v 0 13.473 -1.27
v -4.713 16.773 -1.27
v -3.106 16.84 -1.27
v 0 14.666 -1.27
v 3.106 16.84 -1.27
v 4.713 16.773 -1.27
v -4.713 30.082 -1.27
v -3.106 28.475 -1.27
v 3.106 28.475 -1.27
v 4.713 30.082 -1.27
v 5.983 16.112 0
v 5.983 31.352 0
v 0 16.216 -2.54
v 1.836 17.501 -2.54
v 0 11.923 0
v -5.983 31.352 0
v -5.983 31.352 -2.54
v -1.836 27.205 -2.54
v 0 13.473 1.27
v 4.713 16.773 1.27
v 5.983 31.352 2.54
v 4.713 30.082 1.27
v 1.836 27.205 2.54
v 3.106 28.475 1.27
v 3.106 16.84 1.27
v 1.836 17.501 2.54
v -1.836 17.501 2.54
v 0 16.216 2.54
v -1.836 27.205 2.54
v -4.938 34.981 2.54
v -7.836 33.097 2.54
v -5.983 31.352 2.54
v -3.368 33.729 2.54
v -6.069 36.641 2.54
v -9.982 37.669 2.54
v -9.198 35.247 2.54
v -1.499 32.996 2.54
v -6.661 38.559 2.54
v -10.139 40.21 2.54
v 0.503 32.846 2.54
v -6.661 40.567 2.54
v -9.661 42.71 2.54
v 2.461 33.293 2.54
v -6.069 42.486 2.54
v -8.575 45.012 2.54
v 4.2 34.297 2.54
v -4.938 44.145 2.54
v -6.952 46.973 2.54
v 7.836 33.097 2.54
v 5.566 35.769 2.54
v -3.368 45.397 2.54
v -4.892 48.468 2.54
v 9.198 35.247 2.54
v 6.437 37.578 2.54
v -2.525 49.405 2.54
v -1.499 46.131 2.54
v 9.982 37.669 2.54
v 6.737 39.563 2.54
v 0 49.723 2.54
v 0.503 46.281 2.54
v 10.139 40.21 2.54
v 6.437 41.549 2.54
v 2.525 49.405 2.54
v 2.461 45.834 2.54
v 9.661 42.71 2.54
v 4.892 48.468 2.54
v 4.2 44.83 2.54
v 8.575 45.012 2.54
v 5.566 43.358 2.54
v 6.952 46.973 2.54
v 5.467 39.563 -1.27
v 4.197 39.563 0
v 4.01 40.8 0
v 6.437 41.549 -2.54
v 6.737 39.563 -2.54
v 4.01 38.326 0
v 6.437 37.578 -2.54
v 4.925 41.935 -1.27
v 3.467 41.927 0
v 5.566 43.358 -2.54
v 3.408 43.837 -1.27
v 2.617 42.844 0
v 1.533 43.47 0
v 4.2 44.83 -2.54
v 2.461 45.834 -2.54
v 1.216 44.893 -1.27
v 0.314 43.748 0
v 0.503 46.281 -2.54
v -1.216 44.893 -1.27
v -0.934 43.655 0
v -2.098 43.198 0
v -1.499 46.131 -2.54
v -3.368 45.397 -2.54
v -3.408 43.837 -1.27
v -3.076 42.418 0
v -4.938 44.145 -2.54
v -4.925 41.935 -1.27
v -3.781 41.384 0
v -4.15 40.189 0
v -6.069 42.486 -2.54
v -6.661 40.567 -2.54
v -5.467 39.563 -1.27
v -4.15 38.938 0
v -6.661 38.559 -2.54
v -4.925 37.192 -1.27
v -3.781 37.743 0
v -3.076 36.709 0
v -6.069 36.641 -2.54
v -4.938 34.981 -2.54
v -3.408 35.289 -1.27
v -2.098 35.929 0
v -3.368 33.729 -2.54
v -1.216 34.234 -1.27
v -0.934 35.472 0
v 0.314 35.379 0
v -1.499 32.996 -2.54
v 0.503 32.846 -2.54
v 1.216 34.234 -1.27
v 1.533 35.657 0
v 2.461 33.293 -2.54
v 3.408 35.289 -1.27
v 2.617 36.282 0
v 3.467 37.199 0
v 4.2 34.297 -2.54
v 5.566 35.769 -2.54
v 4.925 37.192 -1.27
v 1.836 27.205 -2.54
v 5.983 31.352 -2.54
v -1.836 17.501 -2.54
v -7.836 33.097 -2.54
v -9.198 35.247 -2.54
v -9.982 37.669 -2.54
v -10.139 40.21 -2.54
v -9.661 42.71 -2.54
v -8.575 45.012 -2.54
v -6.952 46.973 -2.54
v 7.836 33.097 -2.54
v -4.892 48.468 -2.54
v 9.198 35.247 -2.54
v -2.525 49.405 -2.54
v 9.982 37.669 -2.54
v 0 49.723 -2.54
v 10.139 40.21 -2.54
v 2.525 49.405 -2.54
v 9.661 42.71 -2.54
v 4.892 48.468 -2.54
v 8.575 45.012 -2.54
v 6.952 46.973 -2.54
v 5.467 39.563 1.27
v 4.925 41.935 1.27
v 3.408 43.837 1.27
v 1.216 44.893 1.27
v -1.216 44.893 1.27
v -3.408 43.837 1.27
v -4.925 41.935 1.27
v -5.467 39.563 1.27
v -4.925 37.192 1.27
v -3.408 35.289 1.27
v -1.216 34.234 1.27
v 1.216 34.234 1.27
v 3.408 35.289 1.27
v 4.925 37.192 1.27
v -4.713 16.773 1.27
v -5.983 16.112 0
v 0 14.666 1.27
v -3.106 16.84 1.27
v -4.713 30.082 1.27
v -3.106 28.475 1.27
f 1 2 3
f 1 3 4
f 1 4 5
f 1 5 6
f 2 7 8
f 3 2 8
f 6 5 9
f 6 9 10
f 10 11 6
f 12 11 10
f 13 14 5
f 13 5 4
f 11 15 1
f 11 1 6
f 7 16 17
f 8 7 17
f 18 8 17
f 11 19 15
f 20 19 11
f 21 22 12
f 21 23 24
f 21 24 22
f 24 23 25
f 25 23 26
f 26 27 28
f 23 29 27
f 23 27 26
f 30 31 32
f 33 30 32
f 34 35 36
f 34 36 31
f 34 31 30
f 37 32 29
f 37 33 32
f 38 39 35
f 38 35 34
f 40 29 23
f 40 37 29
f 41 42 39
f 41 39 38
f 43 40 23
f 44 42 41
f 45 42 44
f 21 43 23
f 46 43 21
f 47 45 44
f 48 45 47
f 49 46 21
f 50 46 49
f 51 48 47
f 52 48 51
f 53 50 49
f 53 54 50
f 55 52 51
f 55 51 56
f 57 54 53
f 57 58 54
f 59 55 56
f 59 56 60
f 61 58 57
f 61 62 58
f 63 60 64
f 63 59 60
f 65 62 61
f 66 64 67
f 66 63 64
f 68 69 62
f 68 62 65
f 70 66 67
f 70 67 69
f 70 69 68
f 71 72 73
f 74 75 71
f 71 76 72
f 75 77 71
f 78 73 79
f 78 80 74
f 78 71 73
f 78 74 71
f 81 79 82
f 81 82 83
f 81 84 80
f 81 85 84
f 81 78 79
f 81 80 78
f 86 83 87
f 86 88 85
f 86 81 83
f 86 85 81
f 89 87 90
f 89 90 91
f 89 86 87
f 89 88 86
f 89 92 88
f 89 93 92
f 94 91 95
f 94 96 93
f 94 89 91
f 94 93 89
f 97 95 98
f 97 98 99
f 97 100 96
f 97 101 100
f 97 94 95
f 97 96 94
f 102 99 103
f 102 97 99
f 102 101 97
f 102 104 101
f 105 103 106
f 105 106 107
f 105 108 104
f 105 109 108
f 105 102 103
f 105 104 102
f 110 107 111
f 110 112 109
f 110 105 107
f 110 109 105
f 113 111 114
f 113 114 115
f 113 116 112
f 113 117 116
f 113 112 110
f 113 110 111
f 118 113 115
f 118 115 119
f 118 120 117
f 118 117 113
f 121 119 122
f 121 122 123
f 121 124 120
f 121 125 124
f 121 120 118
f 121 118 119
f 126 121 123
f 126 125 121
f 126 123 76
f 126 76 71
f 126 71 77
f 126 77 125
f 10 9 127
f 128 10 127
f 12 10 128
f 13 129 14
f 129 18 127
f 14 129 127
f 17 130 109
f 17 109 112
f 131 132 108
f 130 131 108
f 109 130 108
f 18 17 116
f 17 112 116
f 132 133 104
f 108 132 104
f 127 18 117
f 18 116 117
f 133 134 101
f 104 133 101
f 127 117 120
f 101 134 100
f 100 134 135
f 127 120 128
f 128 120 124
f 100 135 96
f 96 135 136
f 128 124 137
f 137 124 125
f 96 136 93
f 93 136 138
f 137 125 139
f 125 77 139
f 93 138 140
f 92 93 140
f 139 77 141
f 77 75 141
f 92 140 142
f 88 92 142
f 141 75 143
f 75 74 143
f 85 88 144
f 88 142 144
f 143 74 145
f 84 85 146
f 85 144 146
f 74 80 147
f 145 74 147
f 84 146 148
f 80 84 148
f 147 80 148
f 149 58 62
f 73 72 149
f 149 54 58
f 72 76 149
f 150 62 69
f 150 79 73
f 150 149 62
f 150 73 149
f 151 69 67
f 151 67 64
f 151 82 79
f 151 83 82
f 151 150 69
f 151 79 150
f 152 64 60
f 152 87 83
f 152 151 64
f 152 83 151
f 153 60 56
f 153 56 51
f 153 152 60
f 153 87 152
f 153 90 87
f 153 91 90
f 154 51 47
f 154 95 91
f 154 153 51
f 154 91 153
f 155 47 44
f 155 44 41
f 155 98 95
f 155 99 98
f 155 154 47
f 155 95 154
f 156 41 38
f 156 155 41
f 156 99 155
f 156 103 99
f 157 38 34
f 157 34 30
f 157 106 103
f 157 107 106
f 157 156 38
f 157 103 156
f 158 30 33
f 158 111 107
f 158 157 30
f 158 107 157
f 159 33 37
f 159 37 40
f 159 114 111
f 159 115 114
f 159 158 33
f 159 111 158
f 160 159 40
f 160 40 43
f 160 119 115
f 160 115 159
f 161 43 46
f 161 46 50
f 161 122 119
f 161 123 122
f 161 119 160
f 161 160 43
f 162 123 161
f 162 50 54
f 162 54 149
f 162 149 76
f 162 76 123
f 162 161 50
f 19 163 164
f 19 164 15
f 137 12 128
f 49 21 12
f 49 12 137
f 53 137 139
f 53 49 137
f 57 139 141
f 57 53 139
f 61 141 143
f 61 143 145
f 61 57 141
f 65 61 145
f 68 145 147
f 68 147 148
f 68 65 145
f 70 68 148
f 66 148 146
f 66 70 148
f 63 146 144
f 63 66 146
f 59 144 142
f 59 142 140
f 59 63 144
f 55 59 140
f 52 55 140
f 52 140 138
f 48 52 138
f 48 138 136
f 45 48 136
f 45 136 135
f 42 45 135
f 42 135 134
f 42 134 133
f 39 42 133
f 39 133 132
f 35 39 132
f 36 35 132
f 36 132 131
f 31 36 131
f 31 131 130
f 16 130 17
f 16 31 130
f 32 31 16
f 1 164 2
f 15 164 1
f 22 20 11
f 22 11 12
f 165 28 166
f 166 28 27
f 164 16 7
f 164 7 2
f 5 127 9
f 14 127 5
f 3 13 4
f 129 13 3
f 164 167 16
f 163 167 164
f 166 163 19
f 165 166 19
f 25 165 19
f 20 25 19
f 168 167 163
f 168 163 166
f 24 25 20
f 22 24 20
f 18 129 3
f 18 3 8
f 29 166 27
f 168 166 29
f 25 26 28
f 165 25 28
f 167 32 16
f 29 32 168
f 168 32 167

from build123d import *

# Parameters (mm, degrees)
F0_R     = 4.1965730186
F1_DEPTH = 2.54
F2_DEPTH = 1.27
F3_SIZE  = 1.26999
F4_SIZE  = 2.53999


# Not quite as in the source:
# - a fillet or chamfer is up to 0.001 mm smaller than in the source, because OpenCascade refuses the exact size


with BuildPart() as f1:
    # F0 (on Top) → F1 (new body, symmetric)
    with BuildSketch(Plane.XY):
        with BuildLine():
            ThreePointArc((0, 49.7234201631), (-9.6606227132, 42.7095239111), (-5.9829372688, 31.3518392168))
            Line((-5.9829372688, 31.3518392168), (-1.8358110683, 27.2047130163))
            Line((-1.8358110683, 27.2047130163), (-1.8358110683, 17.501438998))
            Line((-1.8358110683, 17.501438998), (0, 16.2159902493))
            Line((0, 16.2159902493), (1.8358110683, 17.501438998))
            Line((1.8358110683, 17.501438998), (1.8358110683, 27.2047130163))
            Line((1.8358110683, 27.2047130163), (5.9829372688, 31.3518392168))
            ThreePointArc((5.9829372688, 31.3518392168), (9.6606227132, 42.7095239111), (0, 49.7234201631))
        make_face()
        with Locations((0, 39.5634201631)):
            Circle(F0_R, mode=Mode.SUBTRACT)
    extrude(amount=F1_DEPTH, both=True)

    # F0 (on Top) → F2 (join, symmetric)
    with BuildSketch(Plane.XY):
        Polygon((-1.8358110683, 27.2047130163), (-5.9829372688, 31.3518392168), (-5.9829372688, 16.1118392168), (0, 11.9225414406), (5.9829372688, 16.1118392168), (5.9829372688, 31.3518392168), (1.8358110683, 27.2047130163), (1.8358110683, 17.501438998), (0, 16.2159902493), (-1.8358110683, 17.501438998), align=None)
    extrude(amount=F2_DEPTH, both=True)

    # F3 (size 1.27 in the source; OpenCascade refuses exactly that, so slightly less here)
    f3_edges = [f1.edges().sort_by_distance(p)[0] for p in [
        (0.917906, 16.858715, 1.27),
        (-0.917906, 16.858715, 1.27),
        (1.835811, 22.353076, 1.27),
        (-1.835811, 22.353076, 1.27),
        (5.982937, 23.731839, 1.27),
        (-5.982937, 23.731839, 1.27),
        (-2.991469, 14.01719, 1.27),
        (2.991469, 14.01719, 1.27),
        (2.991469, 14.01719, -1.27),
        (5.982937, 23.731839, -1.27),
        (0.917906, 16.858715, -1.27),
        (1.835811, 22.353076, -1.27),
        (-0.917906, 16.858715, -1.27),
        (-1.835811, 22.353076, -1.27),
        (-5.982937, 23.731839, -1.27),
        (-2.991469, 14.01719, -1.27),
    ]]
    chamfer(f3_edges, length=F3_SIZE)

    # F4 (size 2.54 in the source; OpenCascade refuses exactly that, so slightly less here)
    f4_edges = [f1.edges().sort_by_distance(p)[0] for p in [
        (-4.196573, 39.56342, 2.54),
        (-4.196573, 39.56342, -2.54),
    ]]
    chamfer(f4_edges, length=F4_SIZE)


solid = f1.part
